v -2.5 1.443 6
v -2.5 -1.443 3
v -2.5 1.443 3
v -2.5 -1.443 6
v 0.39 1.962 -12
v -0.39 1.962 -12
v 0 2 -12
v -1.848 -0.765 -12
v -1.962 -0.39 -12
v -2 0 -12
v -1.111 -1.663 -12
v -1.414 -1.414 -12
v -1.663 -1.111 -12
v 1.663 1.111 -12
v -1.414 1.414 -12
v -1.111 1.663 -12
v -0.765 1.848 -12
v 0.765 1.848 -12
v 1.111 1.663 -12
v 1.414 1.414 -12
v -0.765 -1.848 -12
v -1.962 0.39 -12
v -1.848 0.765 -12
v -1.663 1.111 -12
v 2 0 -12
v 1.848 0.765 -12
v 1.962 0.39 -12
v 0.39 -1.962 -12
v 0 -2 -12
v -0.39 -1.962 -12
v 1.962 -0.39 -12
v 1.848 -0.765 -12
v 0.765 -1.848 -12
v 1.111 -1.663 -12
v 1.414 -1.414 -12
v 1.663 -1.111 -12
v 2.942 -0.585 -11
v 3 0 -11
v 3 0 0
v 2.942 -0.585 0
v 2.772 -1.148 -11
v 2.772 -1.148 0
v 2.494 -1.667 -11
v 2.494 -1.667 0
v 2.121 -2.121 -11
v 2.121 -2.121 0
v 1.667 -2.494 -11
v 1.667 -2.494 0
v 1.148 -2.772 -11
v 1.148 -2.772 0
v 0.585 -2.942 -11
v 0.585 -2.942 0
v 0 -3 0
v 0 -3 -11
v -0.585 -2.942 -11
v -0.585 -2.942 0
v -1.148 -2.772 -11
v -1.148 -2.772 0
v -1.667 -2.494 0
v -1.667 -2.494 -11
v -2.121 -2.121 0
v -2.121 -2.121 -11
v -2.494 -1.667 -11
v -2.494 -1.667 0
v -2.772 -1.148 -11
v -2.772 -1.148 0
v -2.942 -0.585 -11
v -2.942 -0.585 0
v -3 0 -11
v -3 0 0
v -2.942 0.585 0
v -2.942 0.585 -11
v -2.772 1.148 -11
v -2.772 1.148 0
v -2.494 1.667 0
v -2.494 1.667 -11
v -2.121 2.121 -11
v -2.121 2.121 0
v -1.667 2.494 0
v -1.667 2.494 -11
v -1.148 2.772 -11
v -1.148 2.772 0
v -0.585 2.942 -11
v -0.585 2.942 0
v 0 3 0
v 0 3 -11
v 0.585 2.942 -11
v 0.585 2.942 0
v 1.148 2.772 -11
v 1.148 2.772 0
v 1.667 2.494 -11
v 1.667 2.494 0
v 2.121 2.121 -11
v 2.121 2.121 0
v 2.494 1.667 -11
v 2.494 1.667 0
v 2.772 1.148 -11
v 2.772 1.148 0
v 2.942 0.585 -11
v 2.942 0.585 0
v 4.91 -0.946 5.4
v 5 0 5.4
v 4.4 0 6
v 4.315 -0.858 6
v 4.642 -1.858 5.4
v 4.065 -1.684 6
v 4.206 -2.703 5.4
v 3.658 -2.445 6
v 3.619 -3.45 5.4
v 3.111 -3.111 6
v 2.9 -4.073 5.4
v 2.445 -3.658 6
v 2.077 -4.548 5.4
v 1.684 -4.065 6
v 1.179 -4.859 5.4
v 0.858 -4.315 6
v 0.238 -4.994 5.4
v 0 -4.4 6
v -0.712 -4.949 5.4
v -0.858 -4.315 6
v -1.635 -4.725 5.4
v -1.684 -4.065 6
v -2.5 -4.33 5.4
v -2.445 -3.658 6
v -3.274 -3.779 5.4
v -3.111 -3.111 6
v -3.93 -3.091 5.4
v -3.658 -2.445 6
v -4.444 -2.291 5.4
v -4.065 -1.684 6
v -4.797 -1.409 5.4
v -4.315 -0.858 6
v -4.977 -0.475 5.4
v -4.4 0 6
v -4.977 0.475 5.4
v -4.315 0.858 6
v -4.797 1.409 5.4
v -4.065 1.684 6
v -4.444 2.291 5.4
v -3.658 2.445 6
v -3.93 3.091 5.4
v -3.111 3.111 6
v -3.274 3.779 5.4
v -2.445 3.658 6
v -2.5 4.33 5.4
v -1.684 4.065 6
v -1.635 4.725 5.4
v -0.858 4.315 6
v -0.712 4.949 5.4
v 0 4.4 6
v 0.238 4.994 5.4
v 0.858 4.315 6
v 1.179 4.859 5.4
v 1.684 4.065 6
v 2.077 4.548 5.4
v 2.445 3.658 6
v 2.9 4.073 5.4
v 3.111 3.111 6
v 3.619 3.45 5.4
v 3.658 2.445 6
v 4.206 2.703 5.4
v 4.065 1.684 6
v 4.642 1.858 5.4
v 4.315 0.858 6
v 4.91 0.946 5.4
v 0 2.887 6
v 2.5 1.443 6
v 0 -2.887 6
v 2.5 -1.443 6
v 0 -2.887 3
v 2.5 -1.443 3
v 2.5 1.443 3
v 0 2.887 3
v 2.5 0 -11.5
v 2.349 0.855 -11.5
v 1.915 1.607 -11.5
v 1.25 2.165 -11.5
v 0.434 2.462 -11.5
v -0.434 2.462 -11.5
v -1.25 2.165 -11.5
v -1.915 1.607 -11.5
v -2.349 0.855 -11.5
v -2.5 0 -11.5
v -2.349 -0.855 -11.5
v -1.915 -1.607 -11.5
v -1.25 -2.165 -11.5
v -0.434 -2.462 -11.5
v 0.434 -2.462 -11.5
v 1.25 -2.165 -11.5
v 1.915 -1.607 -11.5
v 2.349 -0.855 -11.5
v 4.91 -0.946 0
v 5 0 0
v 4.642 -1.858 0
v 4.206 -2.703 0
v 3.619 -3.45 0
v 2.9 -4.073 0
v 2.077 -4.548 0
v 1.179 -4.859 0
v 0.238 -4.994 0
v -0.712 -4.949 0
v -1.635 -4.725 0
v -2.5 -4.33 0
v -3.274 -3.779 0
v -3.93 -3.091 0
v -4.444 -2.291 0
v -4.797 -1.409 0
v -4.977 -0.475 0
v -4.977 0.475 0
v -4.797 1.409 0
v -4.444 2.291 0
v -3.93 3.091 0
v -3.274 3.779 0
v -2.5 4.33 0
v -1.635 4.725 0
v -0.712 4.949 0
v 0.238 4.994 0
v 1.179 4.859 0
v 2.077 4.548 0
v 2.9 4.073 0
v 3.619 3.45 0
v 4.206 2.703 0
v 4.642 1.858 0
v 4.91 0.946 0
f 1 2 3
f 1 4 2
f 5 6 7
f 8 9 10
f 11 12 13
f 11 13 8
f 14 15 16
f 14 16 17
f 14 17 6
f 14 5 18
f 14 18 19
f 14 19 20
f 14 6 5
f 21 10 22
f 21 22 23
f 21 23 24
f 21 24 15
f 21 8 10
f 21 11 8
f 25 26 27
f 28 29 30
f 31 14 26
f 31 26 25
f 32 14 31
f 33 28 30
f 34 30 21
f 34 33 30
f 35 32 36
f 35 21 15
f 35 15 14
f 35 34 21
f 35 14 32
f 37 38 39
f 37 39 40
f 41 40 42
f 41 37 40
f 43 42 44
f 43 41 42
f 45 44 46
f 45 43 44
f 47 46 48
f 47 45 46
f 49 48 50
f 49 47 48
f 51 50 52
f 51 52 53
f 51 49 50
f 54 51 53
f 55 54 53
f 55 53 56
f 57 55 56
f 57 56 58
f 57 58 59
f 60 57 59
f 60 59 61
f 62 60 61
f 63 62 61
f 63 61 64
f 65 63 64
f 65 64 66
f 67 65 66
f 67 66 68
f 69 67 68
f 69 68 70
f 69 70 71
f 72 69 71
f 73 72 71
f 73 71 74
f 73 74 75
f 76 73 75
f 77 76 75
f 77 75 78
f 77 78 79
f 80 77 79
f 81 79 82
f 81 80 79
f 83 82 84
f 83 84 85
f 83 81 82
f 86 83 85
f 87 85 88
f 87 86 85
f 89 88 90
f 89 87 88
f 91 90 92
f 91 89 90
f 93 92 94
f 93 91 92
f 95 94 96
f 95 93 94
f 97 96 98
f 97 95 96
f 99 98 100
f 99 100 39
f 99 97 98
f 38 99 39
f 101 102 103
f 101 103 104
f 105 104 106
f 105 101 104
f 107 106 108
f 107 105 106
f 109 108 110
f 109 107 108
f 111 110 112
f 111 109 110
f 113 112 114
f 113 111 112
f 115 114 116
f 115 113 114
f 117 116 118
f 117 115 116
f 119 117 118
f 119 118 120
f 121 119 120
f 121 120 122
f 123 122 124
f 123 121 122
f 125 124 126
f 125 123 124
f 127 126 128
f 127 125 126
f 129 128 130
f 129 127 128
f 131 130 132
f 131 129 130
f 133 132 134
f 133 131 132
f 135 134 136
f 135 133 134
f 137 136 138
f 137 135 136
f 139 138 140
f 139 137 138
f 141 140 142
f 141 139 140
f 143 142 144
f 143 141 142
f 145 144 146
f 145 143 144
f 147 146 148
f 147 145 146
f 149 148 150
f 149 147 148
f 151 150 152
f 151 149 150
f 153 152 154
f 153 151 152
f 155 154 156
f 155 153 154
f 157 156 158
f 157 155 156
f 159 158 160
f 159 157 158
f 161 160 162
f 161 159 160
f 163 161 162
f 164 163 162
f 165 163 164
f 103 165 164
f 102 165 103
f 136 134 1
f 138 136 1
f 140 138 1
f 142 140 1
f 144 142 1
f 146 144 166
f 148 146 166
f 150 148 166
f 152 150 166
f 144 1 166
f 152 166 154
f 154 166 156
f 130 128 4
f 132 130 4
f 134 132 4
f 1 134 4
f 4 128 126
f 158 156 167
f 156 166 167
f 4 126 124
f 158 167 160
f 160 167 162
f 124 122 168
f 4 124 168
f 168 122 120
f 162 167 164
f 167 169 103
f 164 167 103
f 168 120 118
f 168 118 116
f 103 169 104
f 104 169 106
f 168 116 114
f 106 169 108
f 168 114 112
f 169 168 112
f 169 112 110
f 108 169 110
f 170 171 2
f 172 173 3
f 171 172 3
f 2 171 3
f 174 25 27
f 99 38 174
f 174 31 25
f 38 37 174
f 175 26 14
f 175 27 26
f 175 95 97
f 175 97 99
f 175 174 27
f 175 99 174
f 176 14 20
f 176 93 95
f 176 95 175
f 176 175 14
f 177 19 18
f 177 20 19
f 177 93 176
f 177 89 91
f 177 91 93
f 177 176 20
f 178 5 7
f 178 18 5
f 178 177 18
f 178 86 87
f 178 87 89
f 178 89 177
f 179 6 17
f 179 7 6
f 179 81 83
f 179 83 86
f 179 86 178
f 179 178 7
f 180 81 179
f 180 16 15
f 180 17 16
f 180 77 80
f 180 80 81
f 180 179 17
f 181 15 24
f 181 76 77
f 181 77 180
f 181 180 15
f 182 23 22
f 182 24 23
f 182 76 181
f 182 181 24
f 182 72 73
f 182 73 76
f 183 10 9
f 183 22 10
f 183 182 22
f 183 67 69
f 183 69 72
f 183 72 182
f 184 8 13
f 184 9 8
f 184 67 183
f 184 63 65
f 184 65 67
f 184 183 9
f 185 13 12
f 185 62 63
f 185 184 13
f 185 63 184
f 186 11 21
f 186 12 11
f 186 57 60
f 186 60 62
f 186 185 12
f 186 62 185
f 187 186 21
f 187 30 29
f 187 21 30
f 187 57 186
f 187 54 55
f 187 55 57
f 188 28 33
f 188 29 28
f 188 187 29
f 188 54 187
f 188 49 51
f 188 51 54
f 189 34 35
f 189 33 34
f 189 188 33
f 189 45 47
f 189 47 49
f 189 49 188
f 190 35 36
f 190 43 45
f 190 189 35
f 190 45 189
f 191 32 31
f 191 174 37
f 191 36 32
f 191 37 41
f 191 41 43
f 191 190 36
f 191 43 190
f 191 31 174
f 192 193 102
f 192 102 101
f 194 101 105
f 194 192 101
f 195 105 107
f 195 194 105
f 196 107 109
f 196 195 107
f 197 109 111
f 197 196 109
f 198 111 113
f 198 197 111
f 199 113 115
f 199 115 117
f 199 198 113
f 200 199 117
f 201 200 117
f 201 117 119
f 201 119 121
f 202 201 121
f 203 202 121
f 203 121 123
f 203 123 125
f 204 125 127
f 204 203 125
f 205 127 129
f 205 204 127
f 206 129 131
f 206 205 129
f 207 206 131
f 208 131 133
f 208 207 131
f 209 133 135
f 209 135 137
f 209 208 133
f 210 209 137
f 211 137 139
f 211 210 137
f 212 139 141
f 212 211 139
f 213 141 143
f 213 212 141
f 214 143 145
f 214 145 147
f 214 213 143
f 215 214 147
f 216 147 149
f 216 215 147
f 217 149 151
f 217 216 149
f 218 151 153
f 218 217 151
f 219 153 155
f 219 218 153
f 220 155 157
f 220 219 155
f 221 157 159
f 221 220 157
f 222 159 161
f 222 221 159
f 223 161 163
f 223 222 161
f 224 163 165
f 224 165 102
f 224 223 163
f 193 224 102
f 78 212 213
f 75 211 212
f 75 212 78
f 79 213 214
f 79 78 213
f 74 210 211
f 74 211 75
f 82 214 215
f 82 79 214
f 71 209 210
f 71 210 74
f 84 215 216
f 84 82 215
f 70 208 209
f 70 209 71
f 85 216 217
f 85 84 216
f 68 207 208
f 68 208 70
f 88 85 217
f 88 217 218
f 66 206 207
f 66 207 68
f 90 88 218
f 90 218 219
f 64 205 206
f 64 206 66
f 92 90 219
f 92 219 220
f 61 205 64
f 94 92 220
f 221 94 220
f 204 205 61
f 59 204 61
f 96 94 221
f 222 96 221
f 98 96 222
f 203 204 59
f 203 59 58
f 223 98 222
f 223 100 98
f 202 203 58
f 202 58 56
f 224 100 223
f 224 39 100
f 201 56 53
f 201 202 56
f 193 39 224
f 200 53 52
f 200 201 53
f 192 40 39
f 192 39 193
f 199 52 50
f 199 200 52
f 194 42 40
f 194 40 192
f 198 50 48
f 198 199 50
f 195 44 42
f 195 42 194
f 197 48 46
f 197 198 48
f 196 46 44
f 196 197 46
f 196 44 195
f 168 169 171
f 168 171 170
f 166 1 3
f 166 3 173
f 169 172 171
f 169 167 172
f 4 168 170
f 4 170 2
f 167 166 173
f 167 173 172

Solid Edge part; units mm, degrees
sketch "Sketch1" plane through (0, 0, 0) normal (0, -1, 0) x (1, 0, 0)
  line L0 (0, 6) -> (4.4, 6)
  line L1 (4.4, 6) -> (5, 5.4)
  line L2 (5, 5.4) -> (5, 0)
  line L3 (5, 0) -> (3, 0)
  line L4 (3, 0) -> (3, -11)
  line L5 (3, -11) -> (2, -12)
  line L6 (2, -12) -> (0, -12)
  line L7 (0, -12) -> (0, 6)
  dimension "D1" = 6
  dimension "D2" = 12
  dimension "D3" = 1
  dimension "D4" = 0.6
  dimension "D5" = 0.6
revolve "RevolvedProtrusion1" add sketch "Sketch1" angle 360 about axis through (0, 0, 54) along (0, 0, -1)
sketch "Sketch2" plane through (0, 0, 6) normal (0, 0, 1) x (0, 1, 0)
  line L0 (-2.8868, 0) -> (-1.4434, 2.5)
  line L1 (-1.4434, 2.5) -> (1.4434, 2.5)
  line L2 (1.4434, 2.5) -> (2.8868, 0)
  line L3 (2.8868, 0) -> (1.4434, -2.5)
  line L4 (1.4434, -2.5) -> (-1.4434, -2.5)
  line L5 (-1.4434, -2.5) -> (-2.8868, 0)
  dimension "D1" = 5
extrude "Cutout1" cut sketch "Sketch2" against normal blind 3
cosmetic_thread "Thread1"
properties material "Steel"
